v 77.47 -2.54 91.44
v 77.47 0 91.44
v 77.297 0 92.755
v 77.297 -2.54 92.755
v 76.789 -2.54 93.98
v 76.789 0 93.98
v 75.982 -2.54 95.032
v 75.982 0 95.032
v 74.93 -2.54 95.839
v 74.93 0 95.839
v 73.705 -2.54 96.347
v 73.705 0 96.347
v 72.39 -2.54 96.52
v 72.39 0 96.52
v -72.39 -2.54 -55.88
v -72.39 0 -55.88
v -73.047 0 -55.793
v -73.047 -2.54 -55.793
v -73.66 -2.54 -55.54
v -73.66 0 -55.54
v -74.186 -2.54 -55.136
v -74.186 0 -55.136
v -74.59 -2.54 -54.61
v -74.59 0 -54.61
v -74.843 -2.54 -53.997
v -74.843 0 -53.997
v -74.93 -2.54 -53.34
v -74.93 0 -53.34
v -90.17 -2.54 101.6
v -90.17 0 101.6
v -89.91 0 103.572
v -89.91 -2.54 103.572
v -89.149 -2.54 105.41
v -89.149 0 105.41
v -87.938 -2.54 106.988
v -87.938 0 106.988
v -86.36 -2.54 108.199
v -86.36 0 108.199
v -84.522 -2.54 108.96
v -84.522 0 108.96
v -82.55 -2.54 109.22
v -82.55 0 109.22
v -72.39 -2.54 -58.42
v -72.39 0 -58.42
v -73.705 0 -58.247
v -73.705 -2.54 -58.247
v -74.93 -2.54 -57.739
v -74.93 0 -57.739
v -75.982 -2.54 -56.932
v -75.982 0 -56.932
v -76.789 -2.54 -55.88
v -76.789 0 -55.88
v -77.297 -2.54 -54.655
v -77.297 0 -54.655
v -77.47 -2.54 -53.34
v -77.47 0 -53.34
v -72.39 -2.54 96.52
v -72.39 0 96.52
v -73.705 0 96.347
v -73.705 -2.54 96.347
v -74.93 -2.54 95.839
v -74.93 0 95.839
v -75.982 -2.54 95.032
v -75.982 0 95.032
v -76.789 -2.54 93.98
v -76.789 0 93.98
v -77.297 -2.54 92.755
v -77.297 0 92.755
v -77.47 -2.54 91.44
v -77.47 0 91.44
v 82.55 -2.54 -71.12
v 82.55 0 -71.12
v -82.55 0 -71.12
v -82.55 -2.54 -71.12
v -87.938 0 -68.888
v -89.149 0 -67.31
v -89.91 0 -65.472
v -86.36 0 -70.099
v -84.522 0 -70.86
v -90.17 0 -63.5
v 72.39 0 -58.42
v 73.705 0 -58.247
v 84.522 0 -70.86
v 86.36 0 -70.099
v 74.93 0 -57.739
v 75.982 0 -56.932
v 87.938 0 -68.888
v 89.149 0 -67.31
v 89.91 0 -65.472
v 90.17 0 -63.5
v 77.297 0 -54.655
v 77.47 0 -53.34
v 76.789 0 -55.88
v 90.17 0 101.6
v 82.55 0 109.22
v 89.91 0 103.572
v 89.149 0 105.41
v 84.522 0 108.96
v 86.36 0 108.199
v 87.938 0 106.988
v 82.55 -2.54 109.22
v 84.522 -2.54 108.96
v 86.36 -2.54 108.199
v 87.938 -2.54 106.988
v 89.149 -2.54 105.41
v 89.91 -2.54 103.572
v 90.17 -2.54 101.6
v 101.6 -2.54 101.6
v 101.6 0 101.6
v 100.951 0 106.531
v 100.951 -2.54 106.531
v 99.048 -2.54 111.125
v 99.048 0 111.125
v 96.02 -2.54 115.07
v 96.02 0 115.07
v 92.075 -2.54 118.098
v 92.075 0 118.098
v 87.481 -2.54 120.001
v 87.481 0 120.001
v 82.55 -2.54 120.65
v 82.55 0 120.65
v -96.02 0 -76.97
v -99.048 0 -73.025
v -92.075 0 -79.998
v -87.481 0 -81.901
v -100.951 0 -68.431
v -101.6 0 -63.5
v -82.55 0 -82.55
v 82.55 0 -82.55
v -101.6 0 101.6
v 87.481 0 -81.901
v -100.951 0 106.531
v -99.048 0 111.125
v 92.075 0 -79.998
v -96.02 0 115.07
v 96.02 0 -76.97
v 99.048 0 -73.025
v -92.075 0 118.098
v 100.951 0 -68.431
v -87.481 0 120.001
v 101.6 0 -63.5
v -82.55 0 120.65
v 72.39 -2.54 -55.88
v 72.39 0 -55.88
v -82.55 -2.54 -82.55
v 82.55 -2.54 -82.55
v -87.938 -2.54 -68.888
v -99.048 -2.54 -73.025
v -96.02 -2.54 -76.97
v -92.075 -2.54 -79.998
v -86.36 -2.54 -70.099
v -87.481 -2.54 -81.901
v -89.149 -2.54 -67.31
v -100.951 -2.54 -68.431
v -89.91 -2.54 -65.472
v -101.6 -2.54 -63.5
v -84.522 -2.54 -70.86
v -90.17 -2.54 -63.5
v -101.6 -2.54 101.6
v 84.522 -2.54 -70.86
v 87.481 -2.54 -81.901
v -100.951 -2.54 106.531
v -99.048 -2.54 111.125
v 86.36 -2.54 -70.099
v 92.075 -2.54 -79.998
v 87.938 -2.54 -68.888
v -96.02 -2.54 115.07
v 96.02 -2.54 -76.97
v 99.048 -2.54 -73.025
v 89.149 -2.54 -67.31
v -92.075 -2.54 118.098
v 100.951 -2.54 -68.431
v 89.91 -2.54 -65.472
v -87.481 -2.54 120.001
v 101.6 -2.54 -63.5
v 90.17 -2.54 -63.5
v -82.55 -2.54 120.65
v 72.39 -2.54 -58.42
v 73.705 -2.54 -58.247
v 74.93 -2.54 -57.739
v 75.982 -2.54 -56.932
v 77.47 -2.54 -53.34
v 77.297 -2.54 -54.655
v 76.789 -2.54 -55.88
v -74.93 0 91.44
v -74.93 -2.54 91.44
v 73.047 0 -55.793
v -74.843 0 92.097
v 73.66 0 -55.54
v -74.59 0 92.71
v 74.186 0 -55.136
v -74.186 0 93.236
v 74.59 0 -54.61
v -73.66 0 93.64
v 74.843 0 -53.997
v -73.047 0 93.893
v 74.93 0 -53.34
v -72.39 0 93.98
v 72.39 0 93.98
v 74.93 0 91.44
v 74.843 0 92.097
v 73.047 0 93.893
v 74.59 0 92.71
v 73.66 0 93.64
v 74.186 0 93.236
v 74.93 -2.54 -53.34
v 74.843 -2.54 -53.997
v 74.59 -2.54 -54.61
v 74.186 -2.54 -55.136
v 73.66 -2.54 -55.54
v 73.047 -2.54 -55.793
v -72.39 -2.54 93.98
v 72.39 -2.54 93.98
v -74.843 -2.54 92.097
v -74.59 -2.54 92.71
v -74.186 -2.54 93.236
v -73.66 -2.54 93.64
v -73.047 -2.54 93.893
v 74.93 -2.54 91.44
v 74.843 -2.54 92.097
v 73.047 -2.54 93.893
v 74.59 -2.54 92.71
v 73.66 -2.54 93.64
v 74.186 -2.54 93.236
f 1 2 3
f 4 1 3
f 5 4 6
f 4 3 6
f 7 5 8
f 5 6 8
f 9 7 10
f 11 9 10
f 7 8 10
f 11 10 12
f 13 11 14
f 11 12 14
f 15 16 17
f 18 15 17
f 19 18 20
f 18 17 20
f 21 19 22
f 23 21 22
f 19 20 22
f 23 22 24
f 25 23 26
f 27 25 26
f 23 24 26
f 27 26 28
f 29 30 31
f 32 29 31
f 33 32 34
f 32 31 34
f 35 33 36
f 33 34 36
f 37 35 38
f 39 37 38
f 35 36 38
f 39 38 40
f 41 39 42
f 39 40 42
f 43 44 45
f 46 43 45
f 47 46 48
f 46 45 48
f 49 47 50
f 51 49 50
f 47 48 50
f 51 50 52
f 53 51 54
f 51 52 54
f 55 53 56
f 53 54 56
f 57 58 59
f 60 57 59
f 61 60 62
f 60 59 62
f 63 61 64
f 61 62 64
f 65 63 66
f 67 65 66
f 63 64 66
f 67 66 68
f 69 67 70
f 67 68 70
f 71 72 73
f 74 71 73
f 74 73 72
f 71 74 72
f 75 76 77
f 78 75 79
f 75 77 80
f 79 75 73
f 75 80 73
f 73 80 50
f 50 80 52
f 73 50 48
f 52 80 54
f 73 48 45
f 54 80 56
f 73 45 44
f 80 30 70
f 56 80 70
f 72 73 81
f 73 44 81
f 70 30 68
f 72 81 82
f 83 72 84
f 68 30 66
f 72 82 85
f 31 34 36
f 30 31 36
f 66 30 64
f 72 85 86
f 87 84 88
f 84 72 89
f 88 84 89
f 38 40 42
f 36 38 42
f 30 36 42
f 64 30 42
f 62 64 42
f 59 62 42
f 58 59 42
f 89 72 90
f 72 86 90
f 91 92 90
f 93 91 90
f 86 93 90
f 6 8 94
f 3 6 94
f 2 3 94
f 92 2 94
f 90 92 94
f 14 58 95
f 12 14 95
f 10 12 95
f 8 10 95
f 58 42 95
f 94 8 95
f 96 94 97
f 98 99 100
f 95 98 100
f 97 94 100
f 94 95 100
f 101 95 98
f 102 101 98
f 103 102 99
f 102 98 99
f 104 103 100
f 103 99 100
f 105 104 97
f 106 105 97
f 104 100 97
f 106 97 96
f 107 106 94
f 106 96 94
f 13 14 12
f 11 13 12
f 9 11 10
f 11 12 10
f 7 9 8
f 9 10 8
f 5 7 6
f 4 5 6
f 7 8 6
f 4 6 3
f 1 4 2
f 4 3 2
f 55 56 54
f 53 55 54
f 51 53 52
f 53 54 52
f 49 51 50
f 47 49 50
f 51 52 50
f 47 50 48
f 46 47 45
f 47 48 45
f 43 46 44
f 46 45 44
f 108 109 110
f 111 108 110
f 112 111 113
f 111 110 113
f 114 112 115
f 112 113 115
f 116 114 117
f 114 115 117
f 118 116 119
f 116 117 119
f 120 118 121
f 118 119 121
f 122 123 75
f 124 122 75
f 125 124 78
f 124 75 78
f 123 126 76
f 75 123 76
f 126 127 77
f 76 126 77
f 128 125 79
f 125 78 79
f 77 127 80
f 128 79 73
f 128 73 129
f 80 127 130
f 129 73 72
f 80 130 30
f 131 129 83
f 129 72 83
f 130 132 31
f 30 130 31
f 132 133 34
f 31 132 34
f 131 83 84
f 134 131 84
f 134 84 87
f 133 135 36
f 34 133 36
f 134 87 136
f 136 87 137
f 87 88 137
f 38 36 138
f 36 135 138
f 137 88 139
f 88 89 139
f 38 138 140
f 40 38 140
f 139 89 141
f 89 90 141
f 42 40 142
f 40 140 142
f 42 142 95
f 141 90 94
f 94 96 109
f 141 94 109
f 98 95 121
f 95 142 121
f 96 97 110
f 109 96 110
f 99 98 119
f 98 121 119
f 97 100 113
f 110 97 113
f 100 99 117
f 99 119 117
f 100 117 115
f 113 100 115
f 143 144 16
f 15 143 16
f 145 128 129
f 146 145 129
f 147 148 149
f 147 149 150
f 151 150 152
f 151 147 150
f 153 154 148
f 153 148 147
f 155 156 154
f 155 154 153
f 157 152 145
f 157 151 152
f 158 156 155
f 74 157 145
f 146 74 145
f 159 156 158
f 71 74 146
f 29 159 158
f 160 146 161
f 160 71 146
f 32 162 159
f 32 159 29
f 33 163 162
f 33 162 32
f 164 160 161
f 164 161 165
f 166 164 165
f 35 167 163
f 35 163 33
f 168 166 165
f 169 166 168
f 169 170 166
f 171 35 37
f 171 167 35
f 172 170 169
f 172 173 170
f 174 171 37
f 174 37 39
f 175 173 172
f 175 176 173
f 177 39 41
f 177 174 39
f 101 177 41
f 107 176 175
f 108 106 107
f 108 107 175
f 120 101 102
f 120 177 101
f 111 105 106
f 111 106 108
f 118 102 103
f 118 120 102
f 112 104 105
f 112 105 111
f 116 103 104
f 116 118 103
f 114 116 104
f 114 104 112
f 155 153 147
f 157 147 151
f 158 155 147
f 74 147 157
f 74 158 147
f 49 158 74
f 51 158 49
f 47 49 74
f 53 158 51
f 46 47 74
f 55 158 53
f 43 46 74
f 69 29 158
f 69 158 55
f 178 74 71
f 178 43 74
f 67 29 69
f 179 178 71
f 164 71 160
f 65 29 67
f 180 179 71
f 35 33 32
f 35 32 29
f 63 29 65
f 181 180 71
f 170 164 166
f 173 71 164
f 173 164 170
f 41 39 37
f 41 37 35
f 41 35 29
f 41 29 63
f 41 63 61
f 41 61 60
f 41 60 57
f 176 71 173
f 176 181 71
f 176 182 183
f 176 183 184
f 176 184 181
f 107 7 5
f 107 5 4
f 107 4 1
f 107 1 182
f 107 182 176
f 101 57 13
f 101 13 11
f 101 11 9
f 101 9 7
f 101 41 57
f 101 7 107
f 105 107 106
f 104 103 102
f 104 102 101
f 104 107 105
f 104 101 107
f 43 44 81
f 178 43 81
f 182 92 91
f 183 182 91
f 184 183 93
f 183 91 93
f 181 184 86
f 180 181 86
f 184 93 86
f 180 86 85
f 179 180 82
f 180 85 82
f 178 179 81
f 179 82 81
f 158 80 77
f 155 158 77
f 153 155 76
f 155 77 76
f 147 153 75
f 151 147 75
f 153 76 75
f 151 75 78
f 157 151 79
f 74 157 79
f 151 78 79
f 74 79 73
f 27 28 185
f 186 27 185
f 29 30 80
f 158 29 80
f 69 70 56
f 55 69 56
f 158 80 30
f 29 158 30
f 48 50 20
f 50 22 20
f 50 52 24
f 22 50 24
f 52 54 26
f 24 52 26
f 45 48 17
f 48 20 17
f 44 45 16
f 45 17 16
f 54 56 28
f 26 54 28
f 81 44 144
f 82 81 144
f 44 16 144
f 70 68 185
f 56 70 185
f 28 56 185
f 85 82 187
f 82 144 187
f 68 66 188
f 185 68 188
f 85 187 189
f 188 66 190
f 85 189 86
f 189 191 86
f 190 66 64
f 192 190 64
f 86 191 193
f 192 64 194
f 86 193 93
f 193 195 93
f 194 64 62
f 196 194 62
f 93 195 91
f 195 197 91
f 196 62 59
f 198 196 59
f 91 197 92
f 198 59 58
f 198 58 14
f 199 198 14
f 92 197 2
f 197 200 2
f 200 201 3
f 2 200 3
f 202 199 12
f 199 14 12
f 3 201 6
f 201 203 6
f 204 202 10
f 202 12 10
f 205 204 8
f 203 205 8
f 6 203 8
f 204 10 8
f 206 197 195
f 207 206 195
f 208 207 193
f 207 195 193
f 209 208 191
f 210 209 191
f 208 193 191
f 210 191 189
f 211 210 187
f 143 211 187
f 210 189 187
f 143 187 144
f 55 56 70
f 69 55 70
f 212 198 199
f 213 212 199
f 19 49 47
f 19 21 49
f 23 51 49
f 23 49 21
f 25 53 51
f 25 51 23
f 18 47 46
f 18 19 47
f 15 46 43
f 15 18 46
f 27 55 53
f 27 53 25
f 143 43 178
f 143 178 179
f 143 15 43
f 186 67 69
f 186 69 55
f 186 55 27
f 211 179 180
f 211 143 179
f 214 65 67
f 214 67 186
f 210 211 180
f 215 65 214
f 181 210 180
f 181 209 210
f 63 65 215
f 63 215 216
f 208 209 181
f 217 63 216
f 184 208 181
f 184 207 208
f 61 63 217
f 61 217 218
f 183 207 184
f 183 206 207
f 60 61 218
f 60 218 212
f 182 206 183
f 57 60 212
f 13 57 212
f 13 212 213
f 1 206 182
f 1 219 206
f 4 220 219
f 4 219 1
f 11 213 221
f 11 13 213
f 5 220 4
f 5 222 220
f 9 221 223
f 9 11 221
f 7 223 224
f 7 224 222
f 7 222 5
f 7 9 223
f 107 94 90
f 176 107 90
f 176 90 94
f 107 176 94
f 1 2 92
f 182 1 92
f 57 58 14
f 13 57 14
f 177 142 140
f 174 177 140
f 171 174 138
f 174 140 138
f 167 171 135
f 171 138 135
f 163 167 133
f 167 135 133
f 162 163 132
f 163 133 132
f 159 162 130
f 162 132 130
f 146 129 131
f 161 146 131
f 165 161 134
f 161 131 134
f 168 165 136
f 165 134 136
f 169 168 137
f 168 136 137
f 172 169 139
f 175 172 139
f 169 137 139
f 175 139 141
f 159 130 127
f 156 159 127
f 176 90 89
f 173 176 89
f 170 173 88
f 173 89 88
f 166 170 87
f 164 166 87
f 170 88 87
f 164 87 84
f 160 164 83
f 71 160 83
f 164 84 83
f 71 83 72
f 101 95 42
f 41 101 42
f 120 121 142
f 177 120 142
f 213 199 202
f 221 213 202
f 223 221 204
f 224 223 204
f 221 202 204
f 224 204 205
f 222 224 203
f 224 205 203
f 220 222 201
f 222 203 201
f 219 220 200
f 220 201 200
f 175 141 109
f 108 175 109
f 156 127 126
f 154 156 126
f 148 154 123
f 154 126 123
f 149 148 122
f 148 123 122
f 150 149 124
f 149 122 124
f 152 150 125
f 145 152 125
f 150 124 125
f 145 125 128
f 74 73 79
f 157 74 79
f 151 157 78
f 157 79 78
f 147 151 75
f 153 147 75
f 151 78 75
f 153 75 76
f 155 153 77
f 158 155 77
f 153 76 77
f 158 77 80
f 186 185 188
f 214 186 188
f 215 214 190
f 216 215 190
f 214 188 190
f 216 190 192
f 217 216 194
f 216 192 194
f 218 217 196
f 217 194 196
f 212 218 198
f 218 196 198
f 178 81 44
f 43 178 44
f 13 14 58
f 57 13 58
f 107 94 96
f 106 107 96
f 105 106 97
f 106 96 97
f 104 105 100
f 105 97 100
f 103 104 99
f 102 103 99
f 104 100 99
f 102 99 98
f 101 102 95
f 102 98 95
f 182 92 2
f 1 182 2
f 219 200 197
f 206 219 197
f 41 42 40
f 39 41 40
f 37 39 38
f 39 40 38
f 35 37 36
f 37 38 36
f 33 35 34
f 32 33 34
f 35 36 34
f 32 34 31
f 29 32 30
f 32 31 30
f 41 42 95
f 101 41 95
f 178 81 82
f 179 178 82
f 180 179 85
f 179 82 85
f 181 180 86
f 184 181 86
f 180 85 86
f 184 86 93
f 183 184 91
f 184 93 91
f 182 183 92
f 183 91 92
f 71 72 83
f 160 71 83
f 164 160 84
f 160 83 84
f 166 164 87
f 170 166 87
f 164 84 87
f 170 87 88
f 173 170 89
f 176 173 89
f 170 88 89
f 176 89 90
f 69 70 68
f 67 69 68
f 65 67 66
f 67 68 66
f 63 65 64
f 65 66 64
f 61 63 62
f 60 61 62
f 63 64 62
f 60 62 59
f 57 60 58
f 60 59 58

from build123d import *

# Parameters (mm, degrees)
F1_DEPTH = 2.54
F2_DEPTH = 2.54


with BuildPart() as f1:
    # F0 (on Front) → F1 (new body)
    with BuildSketch(Plane.XZ):
        with BuildLine():
            ThreePointArc((-82.55, 120.65), (-96.020384, 115.070384), (-101.6, 101.6))
            Line((-101.6, 101.6), (-101.6, 54.021736))
            Line((-101.6, 54.021736), (-101.6, -15.921711))
            Line((-101.6, -15.921711), (-101.6, -63.5))
            ThreePointArc((-101.6, -63.5), (-96.020384, -76.970384), (-82.55, -82.55))
            Line((-82.55, -82.55), (-41.275, -82.55))
            Line((-41.275, -82.55), (41.275, -82.55))
            Line((41.275, -82.55), (82.55, -82.55))
            ThreePointArc((82.55, -82.55), (96.020384, -76.970384), (101.6, -63.5))
            Line((101.6, -63.5), (101.6, 101.6))
            ThreePointArc((101.6, 101.6), (96.020384, 115.070384), (82.55, 120.65))
            Line((82.55, 120.65), (-82.55, 120.65))
        make_face()
        with BuildLine():
            ThreePointArc((-90.170003, 101.6), (-87.938156, 106.988156), (-82.55, 109.220003))
            Line((-82.55, 109.220003), (82.55, 109.220003))
            ThreePointArc((82.55, 109.220003), (87.938156, 106.988156), (90.170003, 101.6))
            Line((90.170003, 101.6), (90.170003, -63.5))
            ThreePointArc((90.170003, -63.5), (87.938156, -68.888156), (82.55, -71.120003))
            Line((82.55, -71.120003), (41.275, -71.120003))
            Line((41.275, -71.120003), (-41.275, -71.120003))
            Line((-41.275, -71.120003), (-82.55, -71.120003))
            ThreePointArc((-82.55, -71.120003), (-87.938156, -68.888156), (-90.170003, -63.5))
            Line((-90.170003, -63.5), (-90.170003, -15.921711))
            Line((-90.170003, -15.921711), (-90.170003, 54.021736))
            Line((-90.170003, 54.021736), (-90.170003, 101.6))
        make_face(mode=Mode.SUBTRACT)
        with BuildLine():
            Line((77.469999, -53.34), (77.469999, 91.44))
            ThreePointArc((77.469999, 91.44), (75.982102, 95.032102), (72.39, 96.519999))
            Line((72.39, 96.519999), (-72.39, 96.519999))
            ThreePointArc((-72.39, 96.519999), (-75.982102, 95.032102), (-77.469999, 91.44))
            Line((-77.469999, 91.44), (-77.469999, -53.34))
            ThreePointArc((-77.469999, -53.34), (-75.982102, -56.932102), (-72.39, -58.419999))
            Line((-72.39, -58.419999), (72.39, -58.419999))
            ThreePointArc((72.39, -58.419999), (75.982102, -56.932102), (77.469999, -53.34))
        make_face()
        with BuildLine():
            Line((-72.39, 93.98), (72.39, 93.98))
            ThreePointArc((72.39, 93.98), (74.186051, 93.236051), (74.93, 91.44))
            Line((74.93, 91.44), (74.93, -53.34))
            ThreePointArc((74.93, -53.34), (74.186051, -55.136051), (72.39, -55.88))
            Line((72.39, -55.88), (-72.39, -55.88))
            ThreePointArc((-72.39, -55.88), (-74.186051, -55.136051), (-74.93, -53.34))
            Line((-74.93, -53.34), (-74.93, 91.44))
            ThreePointArc((-74.93, 91.44), (-74.186051, 93.236051), (-72.39, 93.98))
        make_face(mode=Mode.SUBTRACT)
    extrude(amount=F1_DEPTH)


with BuildPart() as f2:
    # F0 (on Front) → F2 (new body)
    with BuildSketch(Plane.XZ):
        with BuildLine():
            Line((82.55, 109.220003), (-82.55, 109.220003))
            ThreePointArc((-82.55, 109.220003), (-87.938156, 106.988156), (-90.170003, 101.6))
            Line((-90.170003, 101.6), (-90.170003, 54.021736))
            Line((-90.170003, 54.021736), (-90.170003, -15.921711))
            Line((-90.170003, -15.921711), (-90.170003, -63.5))
            ThreePointArc((-90.170003, -63.5), (-87.938156, -68.888156), (-82.55, -71.120003))
            Line((-82.55, -71.120003), (-41.275, -71.120003))
            Line((-41.275, -71.120003), (41.275, -71.120003))
            Line((41.275, -71.120003), (82.55, -71.120003))
            ThreePointArc((82.55, -71.120003), (87.938156, -68.888156), (90.170003, -63.5))
            Line((90.170003, -63.5), (90.170003, 101.6))
            ThreePointArc((90.170003, 101.6), (87.938156, 106.988156), (82.55, 109.220003))
        make_face()
        with BuildLine():
            ThreePointArc((72.39, 96.519999), (75.982102, 95.032102), (77.469999, 91.44))
            Line((77.469999, 91.44), (77.469999, -53.34))
            ThreePointArc((77.469999, -53.34), (75.982102, -56.932102), (72.39, -58.419999))
            Line((72.39, -58.419999), (-72.39, -58.419999))
            ThreePointArc((-72.39, -58.419999), (-75.982102, -56.932102), (-77.469999, -53.34))
            Line((-77.469999, -53.34), (-77.469999, 91.44))
            ThreePointArc((-77.469999, 91.44), (-75.982102, 95.032102), (-72.39, 96.519999))
            Line((-72.39, 96.519999), (72.39, 96.519999))
        make_face(mode=Mode.SUBTRACT)
    extrude(amount=F2_DEPTH)


solid = Compound([f1.part, f2.part])
